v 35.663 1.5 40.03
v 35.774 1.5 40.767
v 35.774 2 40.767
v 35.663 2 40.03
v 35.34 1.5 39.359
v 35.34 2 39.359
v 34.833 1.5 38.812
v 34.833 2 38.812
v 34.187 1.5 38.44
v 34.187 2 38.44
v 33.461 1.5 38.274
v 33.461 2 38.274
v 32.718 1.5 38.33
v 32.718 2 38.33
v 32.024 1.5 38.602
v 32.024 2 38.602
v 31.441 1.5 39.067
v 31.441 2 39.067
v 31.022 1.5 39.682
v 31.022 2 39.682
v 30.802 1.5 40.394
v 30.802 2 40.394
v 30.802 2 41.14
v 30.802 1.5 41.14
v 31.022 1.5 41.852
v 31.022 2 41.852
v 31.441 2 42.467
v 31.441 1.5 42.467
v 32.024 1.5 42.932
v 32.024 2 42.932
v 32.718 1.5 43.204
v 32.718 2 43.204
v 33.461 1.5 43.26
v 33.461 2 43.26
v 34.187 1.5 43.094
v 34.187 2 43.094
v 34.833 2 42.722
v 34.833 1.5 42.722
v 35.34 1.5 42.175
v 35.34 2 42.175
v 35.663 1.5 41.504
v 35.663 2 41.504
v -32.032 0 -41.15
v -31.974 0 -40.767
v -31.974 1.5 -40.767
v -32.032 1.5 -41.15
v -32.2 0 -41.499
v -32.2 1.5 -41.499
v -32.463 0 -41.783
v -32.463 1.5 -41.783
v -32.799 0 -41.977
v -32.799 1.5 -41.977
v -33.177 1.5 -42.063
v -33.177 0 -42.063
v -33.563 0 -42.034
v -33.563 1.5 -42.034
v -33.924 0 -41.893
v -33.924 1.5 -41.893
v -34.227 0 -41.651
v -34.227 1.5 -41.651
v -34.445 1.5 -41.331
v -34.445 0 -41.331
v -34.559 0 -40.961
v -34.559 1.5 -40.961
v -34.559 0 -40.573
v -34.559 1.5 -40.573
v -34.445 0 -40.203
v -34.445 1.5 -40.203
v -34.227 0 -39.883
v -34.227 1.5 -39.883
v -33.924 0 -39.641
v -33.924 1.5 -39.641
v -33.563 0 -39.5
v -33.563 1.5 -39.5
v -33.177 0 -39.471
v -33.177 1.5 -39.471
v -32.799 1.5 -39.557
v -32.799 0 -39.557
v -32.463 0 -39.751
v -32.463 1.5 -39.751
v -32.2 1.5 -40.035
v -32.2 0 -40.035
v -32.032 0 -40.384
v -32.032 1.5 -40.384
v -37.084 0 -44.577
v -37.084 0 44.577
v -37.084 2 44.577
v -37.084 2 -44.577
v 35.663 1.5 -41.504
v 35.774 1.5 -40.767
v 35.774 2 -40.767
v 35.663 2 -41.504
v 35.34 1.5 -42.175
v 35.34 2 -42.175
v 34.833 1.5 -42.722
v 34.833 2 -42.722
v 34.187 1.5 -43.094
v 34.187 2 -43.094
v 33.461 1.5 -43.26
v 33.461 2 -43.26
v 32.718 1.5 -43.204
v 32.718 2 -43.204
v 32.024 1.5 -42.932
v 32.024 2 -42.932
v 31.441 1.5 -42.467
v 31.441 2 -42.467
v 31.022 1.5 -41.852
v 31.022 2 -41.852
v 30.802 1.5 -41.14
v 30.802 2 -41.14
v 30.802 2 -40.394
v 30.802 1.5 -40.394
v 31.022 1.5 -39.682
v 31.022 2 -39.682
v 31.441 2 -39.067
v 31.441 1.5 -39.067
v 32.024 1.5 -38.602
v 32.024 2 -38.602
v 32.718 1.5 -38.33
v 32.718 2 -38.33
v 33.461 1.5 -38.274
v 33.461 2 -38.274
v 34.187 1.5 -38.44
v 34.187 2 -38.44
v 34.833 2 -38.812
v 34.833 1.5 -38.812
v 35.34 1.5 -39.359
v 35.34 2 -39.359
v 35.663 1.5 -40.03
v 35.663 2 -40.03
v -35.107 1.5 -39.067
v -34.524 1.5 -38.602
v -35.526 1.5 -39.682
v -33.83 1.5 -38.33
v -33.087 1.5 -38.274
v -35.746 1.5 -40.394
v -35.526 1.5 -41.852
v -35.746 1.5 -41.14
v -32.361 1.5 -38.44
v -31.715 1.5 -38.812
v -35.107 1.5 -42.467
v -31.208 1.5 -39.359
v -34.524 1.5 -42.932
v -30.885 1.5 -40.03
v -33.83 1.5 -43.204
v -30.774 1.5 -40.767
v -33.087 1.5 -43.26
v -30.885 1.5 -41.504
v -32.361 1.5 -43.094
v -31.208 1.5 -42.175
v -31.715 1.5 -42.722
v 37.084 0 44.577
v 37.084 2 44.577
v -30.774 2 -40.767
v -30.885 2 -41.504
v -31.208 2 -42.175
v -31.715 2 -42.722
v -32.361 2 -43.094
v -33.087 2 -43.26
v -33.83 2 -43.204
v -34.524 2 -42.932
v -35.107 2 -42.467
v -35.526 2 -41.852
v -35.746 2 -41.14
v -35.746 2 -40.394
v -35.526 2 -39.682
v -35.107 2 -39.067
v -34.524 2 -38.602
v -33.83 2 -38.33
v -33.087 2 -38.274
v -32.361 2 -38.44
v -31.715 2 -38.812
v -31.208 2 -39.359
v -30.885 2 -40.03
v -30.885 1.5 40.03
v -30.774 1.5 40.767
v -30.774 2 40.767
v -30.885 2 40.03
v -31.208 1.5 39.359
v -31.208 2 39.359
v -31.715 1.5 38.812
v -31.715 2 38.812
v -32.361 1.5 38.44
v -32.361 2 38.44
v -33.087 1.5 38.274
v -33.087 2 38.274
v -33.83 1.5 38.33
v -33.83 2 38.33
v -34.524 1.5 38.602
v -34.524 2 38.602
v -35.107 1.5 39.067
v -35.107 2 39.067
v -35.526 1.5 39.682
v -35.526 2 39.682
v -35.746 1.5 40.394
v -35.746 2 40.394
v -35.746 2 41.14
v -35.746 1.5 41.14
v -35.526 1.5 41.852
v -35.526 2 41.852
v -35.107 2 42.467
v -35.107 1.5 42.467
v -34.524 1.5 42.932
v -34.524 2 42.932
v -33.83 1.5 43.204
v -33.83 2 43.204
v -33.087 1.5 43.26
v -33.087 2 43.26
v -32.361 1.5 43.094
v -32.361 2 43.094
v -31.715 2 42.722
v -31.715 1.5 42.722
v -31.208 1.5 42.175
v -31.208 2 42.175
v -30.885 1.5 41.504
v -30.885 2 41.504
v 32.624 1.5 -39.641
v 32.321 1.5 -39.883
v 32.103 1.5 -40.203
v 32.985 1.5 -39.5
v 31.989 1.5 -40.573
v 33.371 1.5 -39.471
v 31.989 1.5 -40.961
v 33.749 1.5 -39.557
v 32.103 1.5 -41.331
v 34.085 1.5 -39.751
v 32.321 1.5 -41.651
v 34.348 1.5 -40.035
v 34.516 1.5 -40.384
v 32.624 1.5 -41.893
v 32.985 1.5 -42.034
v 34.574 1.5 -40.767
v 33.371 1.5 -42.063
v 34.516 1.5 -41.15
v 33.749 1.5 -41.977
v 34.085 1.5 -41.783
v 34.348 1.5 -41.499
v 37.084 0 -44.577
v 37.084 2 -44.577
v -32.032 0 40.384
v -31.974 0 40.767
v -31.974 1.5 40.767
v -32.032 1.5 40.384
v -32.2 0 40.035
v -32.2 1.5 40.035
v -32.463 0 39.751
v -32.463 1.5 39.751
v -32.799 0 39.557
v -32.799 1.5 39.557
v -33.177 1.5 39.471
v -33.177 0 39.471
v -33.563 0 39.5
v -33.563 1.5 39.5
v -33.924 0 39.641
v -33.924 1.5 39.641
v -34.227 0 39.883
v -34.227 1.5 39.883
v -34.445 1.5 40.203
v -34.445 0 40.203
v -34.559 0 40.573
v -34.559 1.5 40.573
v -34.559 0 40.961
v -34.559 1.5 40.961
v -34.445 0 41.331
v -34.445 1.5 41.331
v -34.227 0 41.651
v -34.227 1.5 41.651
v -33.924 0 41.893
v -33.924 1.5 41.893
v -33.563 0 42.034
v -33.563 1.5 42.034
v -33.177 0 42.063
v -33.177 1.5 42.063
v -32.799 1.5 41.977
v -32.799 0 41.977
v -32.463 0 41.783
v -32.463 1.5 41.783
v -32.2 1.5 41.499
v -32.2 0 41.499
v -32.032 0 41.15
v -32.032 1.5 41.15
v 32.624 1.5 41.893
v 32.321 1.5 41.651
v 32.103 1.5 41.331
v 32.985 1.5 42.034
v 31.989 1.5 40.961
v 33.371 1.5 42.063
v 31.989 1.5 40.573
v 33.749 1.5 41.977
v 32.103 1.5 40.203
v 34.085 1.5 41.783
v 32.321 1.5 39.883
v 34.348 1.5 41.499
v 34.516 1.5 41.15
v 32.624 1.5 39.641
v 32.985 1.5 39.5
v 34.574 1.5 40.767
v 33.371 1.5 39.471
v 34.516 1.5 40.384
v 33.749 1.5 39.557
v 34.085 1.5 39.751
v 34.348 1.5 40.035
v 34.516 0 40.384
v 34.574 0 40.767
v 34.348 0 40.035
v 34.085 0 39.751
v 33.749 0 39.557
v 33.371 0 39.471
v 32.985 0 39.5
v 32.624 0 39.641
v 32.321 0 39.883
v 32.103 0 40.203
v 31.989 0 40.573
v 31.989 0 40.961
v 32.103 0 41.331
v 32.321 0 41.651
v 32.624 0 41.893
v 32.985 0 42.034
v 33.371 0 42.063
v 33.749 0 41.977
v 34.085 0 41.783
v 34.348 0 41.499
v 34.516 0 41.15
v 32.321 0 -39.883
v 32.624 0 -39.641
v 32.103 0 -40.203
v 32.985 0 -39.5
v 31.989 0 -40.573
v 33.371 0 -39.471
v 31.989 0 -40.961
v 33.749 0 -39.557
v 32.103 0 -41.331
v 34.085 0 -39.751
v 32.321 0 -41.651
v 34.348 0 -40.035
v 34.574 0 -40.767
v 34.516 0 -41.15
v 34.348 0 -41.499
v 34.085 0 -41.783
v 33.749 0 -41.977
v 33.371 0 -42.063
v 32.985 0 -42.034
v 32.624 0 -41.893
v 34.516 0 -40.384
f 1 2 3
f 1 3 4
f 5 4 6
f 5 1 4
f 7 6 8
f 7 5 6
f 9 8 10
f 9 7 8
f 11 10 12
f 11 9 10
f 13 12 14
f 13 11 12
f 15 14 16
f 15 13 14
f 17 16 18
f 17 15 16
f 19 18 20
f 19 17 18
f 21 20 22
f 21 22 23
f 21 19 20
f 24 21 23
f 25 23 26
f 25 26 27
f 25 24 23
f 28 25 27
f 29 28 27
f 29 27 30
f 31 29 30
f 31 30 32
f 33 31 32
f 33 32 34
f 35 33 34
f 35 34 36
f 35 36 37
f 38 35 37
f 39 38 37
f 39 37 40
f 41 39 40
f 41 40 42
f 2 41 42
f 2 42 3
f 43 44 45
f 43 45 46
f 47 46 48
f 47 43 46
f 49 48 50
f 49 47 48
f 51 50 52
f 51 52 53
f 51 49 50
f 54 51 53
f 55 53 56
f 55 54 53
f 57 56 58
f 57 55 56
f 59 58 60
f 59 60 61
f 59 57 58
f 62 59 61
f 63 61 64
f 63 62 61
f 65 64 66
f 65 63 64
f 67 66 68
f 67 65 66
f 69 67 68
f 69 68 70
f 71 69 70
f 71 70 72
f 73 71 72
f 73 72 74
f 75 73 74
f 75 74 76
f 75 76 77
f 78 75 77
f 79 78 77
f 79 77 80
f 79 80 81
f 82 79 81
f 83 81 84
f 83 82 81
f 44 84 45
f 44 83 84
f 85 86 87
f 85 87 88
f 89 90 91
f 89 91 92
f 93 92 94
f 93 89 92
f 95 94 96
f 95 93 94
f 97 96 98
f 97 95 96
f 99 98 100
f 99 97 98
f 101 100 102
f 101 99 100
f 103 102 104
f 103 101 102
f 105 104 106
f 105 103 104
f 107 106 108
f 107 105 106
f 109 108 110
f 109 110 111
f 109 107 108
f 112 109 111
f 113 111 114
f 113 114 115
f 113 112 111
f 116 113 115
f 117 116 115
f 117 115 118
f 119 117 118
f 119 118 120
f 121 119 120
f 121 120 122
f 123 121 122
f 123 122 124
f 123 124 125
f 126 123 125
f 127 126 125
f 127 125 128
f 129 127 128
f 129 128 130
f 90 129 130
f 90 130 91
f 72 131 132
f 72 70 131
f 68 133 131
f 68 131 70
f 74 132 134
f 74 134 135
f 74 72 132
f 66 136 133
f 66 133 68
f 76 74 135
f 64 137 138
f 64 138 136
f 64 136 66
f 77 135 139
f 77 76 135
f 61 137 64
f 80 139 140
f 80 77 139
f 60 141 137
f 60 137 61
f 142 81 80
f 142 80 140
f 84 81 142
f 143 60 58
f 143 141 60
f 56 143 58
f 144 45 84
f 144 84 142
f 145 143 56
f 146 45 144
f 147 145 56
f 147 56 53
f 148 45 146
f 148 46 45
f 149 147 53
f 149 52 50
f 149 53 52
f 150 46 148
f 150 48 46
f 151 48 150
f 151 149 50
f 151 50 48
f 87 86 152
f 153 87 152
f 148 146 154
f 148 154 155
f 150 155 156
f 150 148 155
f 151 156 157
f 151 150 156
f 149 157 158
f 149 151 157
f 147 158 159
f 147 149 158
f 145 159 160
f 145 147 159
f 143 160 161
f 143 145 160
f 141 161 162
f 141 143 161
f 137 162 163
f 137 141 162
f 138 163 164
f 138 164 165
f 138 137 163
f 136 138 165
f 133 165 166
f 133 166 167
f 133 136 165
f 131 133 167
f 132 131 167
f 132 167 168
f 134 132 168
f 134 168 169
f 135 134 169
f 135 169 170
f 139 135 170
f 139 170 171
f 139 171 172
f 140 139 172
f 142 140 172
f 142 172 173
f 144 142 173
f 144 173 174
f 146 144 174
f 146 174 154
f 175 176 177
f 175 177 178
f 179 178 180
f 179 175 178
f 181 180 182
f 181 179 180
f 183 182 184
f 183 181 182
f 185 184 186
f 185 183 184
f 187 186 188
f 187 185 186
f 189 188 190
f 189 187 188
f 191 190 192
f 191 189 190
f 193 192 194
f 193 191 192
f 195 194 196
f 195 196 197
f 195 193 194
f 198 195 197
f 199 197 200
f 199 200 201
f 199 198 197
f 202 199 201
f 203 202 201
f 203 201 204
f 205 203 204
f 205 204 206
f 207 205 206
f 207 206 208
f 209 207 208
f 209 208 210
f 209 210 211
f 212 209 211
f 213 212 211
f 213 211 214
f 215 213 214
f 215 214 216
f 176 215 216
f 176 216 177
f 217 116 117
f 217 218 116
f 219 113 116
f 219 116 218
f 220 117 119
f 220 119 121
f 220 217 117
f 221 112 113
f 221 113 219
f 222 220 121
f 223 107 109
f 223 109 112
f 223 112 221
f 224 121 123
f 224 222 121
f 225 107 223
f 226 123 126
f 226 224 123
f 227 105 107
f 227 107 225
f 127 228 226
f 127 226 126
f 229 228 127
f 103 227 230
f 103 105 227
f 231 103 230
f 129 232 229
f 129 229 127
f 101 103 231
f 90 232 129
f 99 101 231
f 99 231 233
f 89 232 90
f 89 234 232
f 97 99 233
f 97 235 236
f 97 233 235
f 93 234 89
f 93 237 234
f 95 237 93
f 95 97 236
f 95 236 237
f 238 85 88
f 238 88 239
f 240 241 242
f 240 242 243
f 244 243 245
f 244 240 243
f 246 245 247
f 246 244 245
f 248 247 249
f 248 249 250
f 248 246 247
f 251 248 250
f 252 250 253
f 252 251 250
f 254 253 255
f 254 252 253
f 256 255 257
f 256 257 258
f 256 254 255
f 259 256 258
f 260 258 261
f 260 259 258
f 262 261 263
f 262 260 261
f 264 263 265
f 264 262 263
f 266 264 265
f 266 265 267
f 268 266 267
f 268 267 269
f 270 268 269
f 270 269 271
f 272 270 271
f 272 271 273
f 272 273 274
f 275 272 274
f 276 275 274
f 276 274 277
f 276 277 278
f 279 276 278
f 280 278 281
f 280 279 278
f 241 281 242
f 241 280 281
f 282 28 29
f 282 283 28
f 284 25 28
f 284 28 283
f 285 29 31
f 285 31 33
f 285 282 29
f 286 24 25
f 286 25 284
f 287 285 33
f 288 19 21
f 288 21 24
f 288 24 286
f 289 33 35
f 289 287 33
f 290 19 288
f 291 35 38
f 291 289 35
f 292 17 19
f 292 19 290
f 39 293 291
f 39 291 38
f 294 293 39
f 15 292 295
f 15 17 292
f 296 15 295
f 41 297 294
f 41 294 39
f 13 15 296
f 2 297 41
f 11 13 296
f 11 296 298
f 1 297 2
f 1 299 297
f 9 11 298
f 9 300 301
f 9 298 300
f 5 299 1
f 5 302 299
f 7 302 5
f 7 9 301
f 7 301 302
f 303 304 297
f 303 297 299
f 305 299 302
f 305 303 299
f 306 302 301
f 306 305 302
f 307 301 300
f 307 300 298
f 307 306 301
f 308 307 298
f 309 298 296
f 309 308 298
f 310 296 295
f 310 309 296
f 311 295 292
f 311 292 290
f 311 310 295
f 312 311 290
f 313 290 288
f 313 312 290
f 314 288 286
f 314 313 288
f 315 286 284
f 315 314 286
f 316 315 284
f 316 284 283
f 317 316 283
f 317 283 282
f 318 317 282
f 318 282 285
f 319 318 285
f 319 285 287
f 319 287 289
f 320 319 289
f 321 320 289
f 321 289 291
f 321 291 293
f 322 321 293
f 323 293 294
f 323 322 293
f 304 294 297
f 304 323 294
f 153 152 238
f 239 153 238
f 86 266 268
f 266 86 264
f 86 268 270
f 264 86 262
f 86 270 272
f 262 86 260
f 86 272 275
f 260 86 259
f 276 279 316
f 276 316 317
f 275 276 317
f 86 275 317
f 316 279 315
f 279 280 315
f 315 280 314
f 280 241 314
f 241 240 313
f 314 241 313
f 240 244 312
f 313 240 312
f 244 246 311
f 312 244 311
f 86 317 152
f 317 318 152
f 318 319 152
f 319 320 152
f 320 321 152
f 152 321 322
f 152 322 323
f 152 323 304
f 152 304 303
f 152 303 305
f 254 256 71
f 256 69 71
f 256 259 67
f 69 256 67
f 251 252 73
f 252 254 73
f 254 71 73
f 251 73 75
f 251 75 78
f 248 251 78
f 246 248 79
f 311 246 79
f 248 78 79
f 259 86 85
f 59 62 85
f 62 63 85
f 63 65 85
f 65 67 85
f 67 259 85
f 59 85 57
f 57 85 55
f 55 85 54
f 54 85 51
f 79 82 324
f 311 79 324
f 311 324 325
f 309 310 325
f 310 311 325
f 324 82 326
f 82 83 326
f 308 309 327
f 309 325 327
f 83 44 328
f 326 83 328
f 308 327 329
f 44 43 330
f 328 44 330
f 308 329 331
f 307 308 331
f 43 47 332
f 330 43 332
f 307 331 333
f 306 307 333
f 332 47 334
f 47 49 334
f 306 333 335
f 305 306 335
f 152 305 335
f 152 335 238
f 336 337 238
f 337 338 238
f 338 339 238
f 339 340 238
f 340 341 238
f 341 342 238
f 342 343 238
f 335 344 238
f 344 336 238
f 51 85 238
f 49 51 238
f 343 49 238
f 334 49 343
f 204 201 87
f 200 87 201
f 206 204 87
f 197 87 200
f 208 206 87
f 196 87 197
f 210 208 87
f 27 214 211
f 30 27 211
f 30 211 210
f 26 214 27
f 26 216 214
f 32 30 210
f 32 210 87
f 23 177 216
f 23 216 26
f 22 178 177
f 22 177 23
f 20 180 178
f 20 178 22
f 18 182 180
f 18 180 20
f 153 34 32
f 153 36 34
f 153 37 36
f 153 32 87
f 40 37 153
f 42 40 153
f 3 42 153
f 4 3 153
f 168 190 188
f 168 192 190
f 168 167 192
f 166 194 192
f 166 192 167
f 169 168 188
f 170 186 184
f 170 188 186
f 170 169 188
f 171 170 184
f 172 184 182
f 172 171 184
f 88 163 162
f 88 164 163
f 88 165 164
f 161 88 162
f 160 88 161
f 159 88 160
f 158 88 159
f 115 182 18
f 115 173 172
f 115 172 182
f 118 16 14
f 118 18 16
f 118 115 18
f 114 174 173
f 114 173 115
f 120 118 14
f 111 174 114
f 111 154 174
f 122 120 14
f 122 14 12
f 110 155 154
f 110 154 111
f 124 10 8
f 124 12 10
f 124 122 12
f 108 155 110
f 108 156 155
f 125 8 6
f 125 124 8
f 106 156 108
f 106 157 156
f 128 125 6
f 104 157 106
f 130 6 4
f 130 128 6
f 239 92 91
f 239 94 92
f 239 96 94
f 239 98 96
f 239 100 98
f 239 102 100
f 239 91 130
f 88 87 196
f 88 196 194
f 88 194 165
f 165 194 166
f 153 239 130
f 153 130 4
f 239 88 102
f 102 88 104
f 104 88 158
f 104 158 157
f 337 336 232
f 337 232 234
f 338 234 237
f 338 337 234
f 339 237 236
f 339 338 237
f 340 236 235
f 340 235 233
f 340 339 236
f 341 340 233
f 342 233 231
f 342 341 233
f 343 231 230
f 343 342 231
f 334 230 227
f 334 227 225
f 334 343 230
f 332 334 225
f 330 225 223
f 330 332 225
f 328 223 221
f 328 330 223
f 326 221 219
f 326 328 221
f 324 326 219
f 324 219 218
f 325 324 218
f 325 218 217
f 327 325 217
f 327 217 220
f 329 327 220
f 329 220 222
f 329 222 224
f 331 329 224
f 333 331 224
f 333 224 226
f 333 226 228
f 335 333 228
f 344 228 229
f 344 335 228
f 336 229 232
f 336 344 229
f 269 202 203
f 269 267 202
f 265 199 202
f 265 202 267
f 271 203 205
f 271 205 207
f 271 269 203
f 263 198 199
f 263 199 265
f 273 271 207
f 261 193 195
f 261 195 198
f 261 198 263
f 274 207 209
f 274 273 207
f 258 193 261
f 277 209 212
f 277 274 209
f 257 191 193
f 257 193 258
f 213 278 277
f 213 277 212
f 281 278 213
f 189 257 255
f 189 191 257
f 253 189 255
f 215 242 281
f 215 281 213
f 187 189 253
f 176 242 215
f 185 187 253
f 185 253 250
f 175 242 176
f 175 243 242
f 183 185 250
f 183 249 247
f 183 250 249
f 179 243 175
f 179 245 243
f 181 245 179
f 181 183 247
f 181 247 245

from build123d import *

# Parameters (mm, degrees)
SKETCH1_W           = 74.168
SKETCH1_H           = 89.154
SKETCH1_R           = 2.5
BOSS_EXTRUDE2_DEPTH = 2
SKETCH1_3_R         = 2.5
SKETCH1_3_R_2       = 1.3
BOSS_EXTRUDE3_DEPTH = 1.5


with BuildPart() as part:
    # Sketch1 → Boss-Extrude2 (new body)
    with BuildSketch(Plane(origin=(0, 0, 0), x_dir=(1, 0, 0), z_dir=(0, 1, 0))):
        Rectangle(SKETCH1_W, SKETCH1_H)
        with Locations((-33.274, -40.767)):
            Circle(SKETCH1_R, mode=Mode.SUBTRACT)
        with Locations((33.274, -40.767)):
            Circle(SKETCH1_R, mode=Mode.SUBTRACT)
        with Locations((-33.274, 40.767)):
            Circle(SKETCH1_R, mode=Mode.SUBTRACT)
        with Locations((33.274, 40.767)):
            Circle(SKETCH1_R, mode=Mode.SUBTRACT)
    extrude(amount=BOSS_EXTRUDE2_DEPTH)

    # Sketch1<3> → Boss-Extrude3 (add)
    # profile 1 of 4: a face of its own
    with BuildSketch(Plane(origin=(0, 0, 0), x_dir=(1, 0, 0), z_dir=(0, 1, 0))):
        with Locations((-33.274, 40.767)):
            Circle(SKETCH1_3_R)
        with Locations((-33.274, 40.767)):
            Circle(SKETCH1_3_R_2, mode=Mode.SUBTRACT)
    # profile 2 of 4: a face of its own
    with BuildSketch(Plane(origin=(0, 0, 0), x_dir=(1, 0, 0), z_dir=(0, 1, 0))):
        with Locations((33.274, 40.767)):
            Circle(SKETCH1_3_R)
        with Locations((33.274, 40.767)):
            Circle(SKETCH1_3_R_2, mode=Mode.SUBTRACT)
    # profile 3 of 4: a face of its own
    with BuildSketch(Plane(origin=(0, 0, 0), x_dir=(1, 0, 0), z_dir=(0, 1, 0))):
        with Locations((33.274, -40.767)):
            Circle(SKETCH1_3_R)
        with Locations((33.274, -40.767)):
            Circle(SKETCH1_3_R_2, mode=Mode.SUBTRACT)
    # profile 4 of 4: a face of its own
    with BuildSketch(Plane(origin=(0, 0, 0), x_dir=(1, 0, 0), z_dir=(0, 1, 0))):
        with Locations((-33.274, -40.767)):
            Circle(SKETCH1_3_R)
        with Locations((-33.274, -40.767)):
            Circle(SKETCH1_3_R_2, mode=Mode.SUBTRACT)
    extrude(amount=BOSS_EXTRUDE3_DEPTH)


solid = part.part
